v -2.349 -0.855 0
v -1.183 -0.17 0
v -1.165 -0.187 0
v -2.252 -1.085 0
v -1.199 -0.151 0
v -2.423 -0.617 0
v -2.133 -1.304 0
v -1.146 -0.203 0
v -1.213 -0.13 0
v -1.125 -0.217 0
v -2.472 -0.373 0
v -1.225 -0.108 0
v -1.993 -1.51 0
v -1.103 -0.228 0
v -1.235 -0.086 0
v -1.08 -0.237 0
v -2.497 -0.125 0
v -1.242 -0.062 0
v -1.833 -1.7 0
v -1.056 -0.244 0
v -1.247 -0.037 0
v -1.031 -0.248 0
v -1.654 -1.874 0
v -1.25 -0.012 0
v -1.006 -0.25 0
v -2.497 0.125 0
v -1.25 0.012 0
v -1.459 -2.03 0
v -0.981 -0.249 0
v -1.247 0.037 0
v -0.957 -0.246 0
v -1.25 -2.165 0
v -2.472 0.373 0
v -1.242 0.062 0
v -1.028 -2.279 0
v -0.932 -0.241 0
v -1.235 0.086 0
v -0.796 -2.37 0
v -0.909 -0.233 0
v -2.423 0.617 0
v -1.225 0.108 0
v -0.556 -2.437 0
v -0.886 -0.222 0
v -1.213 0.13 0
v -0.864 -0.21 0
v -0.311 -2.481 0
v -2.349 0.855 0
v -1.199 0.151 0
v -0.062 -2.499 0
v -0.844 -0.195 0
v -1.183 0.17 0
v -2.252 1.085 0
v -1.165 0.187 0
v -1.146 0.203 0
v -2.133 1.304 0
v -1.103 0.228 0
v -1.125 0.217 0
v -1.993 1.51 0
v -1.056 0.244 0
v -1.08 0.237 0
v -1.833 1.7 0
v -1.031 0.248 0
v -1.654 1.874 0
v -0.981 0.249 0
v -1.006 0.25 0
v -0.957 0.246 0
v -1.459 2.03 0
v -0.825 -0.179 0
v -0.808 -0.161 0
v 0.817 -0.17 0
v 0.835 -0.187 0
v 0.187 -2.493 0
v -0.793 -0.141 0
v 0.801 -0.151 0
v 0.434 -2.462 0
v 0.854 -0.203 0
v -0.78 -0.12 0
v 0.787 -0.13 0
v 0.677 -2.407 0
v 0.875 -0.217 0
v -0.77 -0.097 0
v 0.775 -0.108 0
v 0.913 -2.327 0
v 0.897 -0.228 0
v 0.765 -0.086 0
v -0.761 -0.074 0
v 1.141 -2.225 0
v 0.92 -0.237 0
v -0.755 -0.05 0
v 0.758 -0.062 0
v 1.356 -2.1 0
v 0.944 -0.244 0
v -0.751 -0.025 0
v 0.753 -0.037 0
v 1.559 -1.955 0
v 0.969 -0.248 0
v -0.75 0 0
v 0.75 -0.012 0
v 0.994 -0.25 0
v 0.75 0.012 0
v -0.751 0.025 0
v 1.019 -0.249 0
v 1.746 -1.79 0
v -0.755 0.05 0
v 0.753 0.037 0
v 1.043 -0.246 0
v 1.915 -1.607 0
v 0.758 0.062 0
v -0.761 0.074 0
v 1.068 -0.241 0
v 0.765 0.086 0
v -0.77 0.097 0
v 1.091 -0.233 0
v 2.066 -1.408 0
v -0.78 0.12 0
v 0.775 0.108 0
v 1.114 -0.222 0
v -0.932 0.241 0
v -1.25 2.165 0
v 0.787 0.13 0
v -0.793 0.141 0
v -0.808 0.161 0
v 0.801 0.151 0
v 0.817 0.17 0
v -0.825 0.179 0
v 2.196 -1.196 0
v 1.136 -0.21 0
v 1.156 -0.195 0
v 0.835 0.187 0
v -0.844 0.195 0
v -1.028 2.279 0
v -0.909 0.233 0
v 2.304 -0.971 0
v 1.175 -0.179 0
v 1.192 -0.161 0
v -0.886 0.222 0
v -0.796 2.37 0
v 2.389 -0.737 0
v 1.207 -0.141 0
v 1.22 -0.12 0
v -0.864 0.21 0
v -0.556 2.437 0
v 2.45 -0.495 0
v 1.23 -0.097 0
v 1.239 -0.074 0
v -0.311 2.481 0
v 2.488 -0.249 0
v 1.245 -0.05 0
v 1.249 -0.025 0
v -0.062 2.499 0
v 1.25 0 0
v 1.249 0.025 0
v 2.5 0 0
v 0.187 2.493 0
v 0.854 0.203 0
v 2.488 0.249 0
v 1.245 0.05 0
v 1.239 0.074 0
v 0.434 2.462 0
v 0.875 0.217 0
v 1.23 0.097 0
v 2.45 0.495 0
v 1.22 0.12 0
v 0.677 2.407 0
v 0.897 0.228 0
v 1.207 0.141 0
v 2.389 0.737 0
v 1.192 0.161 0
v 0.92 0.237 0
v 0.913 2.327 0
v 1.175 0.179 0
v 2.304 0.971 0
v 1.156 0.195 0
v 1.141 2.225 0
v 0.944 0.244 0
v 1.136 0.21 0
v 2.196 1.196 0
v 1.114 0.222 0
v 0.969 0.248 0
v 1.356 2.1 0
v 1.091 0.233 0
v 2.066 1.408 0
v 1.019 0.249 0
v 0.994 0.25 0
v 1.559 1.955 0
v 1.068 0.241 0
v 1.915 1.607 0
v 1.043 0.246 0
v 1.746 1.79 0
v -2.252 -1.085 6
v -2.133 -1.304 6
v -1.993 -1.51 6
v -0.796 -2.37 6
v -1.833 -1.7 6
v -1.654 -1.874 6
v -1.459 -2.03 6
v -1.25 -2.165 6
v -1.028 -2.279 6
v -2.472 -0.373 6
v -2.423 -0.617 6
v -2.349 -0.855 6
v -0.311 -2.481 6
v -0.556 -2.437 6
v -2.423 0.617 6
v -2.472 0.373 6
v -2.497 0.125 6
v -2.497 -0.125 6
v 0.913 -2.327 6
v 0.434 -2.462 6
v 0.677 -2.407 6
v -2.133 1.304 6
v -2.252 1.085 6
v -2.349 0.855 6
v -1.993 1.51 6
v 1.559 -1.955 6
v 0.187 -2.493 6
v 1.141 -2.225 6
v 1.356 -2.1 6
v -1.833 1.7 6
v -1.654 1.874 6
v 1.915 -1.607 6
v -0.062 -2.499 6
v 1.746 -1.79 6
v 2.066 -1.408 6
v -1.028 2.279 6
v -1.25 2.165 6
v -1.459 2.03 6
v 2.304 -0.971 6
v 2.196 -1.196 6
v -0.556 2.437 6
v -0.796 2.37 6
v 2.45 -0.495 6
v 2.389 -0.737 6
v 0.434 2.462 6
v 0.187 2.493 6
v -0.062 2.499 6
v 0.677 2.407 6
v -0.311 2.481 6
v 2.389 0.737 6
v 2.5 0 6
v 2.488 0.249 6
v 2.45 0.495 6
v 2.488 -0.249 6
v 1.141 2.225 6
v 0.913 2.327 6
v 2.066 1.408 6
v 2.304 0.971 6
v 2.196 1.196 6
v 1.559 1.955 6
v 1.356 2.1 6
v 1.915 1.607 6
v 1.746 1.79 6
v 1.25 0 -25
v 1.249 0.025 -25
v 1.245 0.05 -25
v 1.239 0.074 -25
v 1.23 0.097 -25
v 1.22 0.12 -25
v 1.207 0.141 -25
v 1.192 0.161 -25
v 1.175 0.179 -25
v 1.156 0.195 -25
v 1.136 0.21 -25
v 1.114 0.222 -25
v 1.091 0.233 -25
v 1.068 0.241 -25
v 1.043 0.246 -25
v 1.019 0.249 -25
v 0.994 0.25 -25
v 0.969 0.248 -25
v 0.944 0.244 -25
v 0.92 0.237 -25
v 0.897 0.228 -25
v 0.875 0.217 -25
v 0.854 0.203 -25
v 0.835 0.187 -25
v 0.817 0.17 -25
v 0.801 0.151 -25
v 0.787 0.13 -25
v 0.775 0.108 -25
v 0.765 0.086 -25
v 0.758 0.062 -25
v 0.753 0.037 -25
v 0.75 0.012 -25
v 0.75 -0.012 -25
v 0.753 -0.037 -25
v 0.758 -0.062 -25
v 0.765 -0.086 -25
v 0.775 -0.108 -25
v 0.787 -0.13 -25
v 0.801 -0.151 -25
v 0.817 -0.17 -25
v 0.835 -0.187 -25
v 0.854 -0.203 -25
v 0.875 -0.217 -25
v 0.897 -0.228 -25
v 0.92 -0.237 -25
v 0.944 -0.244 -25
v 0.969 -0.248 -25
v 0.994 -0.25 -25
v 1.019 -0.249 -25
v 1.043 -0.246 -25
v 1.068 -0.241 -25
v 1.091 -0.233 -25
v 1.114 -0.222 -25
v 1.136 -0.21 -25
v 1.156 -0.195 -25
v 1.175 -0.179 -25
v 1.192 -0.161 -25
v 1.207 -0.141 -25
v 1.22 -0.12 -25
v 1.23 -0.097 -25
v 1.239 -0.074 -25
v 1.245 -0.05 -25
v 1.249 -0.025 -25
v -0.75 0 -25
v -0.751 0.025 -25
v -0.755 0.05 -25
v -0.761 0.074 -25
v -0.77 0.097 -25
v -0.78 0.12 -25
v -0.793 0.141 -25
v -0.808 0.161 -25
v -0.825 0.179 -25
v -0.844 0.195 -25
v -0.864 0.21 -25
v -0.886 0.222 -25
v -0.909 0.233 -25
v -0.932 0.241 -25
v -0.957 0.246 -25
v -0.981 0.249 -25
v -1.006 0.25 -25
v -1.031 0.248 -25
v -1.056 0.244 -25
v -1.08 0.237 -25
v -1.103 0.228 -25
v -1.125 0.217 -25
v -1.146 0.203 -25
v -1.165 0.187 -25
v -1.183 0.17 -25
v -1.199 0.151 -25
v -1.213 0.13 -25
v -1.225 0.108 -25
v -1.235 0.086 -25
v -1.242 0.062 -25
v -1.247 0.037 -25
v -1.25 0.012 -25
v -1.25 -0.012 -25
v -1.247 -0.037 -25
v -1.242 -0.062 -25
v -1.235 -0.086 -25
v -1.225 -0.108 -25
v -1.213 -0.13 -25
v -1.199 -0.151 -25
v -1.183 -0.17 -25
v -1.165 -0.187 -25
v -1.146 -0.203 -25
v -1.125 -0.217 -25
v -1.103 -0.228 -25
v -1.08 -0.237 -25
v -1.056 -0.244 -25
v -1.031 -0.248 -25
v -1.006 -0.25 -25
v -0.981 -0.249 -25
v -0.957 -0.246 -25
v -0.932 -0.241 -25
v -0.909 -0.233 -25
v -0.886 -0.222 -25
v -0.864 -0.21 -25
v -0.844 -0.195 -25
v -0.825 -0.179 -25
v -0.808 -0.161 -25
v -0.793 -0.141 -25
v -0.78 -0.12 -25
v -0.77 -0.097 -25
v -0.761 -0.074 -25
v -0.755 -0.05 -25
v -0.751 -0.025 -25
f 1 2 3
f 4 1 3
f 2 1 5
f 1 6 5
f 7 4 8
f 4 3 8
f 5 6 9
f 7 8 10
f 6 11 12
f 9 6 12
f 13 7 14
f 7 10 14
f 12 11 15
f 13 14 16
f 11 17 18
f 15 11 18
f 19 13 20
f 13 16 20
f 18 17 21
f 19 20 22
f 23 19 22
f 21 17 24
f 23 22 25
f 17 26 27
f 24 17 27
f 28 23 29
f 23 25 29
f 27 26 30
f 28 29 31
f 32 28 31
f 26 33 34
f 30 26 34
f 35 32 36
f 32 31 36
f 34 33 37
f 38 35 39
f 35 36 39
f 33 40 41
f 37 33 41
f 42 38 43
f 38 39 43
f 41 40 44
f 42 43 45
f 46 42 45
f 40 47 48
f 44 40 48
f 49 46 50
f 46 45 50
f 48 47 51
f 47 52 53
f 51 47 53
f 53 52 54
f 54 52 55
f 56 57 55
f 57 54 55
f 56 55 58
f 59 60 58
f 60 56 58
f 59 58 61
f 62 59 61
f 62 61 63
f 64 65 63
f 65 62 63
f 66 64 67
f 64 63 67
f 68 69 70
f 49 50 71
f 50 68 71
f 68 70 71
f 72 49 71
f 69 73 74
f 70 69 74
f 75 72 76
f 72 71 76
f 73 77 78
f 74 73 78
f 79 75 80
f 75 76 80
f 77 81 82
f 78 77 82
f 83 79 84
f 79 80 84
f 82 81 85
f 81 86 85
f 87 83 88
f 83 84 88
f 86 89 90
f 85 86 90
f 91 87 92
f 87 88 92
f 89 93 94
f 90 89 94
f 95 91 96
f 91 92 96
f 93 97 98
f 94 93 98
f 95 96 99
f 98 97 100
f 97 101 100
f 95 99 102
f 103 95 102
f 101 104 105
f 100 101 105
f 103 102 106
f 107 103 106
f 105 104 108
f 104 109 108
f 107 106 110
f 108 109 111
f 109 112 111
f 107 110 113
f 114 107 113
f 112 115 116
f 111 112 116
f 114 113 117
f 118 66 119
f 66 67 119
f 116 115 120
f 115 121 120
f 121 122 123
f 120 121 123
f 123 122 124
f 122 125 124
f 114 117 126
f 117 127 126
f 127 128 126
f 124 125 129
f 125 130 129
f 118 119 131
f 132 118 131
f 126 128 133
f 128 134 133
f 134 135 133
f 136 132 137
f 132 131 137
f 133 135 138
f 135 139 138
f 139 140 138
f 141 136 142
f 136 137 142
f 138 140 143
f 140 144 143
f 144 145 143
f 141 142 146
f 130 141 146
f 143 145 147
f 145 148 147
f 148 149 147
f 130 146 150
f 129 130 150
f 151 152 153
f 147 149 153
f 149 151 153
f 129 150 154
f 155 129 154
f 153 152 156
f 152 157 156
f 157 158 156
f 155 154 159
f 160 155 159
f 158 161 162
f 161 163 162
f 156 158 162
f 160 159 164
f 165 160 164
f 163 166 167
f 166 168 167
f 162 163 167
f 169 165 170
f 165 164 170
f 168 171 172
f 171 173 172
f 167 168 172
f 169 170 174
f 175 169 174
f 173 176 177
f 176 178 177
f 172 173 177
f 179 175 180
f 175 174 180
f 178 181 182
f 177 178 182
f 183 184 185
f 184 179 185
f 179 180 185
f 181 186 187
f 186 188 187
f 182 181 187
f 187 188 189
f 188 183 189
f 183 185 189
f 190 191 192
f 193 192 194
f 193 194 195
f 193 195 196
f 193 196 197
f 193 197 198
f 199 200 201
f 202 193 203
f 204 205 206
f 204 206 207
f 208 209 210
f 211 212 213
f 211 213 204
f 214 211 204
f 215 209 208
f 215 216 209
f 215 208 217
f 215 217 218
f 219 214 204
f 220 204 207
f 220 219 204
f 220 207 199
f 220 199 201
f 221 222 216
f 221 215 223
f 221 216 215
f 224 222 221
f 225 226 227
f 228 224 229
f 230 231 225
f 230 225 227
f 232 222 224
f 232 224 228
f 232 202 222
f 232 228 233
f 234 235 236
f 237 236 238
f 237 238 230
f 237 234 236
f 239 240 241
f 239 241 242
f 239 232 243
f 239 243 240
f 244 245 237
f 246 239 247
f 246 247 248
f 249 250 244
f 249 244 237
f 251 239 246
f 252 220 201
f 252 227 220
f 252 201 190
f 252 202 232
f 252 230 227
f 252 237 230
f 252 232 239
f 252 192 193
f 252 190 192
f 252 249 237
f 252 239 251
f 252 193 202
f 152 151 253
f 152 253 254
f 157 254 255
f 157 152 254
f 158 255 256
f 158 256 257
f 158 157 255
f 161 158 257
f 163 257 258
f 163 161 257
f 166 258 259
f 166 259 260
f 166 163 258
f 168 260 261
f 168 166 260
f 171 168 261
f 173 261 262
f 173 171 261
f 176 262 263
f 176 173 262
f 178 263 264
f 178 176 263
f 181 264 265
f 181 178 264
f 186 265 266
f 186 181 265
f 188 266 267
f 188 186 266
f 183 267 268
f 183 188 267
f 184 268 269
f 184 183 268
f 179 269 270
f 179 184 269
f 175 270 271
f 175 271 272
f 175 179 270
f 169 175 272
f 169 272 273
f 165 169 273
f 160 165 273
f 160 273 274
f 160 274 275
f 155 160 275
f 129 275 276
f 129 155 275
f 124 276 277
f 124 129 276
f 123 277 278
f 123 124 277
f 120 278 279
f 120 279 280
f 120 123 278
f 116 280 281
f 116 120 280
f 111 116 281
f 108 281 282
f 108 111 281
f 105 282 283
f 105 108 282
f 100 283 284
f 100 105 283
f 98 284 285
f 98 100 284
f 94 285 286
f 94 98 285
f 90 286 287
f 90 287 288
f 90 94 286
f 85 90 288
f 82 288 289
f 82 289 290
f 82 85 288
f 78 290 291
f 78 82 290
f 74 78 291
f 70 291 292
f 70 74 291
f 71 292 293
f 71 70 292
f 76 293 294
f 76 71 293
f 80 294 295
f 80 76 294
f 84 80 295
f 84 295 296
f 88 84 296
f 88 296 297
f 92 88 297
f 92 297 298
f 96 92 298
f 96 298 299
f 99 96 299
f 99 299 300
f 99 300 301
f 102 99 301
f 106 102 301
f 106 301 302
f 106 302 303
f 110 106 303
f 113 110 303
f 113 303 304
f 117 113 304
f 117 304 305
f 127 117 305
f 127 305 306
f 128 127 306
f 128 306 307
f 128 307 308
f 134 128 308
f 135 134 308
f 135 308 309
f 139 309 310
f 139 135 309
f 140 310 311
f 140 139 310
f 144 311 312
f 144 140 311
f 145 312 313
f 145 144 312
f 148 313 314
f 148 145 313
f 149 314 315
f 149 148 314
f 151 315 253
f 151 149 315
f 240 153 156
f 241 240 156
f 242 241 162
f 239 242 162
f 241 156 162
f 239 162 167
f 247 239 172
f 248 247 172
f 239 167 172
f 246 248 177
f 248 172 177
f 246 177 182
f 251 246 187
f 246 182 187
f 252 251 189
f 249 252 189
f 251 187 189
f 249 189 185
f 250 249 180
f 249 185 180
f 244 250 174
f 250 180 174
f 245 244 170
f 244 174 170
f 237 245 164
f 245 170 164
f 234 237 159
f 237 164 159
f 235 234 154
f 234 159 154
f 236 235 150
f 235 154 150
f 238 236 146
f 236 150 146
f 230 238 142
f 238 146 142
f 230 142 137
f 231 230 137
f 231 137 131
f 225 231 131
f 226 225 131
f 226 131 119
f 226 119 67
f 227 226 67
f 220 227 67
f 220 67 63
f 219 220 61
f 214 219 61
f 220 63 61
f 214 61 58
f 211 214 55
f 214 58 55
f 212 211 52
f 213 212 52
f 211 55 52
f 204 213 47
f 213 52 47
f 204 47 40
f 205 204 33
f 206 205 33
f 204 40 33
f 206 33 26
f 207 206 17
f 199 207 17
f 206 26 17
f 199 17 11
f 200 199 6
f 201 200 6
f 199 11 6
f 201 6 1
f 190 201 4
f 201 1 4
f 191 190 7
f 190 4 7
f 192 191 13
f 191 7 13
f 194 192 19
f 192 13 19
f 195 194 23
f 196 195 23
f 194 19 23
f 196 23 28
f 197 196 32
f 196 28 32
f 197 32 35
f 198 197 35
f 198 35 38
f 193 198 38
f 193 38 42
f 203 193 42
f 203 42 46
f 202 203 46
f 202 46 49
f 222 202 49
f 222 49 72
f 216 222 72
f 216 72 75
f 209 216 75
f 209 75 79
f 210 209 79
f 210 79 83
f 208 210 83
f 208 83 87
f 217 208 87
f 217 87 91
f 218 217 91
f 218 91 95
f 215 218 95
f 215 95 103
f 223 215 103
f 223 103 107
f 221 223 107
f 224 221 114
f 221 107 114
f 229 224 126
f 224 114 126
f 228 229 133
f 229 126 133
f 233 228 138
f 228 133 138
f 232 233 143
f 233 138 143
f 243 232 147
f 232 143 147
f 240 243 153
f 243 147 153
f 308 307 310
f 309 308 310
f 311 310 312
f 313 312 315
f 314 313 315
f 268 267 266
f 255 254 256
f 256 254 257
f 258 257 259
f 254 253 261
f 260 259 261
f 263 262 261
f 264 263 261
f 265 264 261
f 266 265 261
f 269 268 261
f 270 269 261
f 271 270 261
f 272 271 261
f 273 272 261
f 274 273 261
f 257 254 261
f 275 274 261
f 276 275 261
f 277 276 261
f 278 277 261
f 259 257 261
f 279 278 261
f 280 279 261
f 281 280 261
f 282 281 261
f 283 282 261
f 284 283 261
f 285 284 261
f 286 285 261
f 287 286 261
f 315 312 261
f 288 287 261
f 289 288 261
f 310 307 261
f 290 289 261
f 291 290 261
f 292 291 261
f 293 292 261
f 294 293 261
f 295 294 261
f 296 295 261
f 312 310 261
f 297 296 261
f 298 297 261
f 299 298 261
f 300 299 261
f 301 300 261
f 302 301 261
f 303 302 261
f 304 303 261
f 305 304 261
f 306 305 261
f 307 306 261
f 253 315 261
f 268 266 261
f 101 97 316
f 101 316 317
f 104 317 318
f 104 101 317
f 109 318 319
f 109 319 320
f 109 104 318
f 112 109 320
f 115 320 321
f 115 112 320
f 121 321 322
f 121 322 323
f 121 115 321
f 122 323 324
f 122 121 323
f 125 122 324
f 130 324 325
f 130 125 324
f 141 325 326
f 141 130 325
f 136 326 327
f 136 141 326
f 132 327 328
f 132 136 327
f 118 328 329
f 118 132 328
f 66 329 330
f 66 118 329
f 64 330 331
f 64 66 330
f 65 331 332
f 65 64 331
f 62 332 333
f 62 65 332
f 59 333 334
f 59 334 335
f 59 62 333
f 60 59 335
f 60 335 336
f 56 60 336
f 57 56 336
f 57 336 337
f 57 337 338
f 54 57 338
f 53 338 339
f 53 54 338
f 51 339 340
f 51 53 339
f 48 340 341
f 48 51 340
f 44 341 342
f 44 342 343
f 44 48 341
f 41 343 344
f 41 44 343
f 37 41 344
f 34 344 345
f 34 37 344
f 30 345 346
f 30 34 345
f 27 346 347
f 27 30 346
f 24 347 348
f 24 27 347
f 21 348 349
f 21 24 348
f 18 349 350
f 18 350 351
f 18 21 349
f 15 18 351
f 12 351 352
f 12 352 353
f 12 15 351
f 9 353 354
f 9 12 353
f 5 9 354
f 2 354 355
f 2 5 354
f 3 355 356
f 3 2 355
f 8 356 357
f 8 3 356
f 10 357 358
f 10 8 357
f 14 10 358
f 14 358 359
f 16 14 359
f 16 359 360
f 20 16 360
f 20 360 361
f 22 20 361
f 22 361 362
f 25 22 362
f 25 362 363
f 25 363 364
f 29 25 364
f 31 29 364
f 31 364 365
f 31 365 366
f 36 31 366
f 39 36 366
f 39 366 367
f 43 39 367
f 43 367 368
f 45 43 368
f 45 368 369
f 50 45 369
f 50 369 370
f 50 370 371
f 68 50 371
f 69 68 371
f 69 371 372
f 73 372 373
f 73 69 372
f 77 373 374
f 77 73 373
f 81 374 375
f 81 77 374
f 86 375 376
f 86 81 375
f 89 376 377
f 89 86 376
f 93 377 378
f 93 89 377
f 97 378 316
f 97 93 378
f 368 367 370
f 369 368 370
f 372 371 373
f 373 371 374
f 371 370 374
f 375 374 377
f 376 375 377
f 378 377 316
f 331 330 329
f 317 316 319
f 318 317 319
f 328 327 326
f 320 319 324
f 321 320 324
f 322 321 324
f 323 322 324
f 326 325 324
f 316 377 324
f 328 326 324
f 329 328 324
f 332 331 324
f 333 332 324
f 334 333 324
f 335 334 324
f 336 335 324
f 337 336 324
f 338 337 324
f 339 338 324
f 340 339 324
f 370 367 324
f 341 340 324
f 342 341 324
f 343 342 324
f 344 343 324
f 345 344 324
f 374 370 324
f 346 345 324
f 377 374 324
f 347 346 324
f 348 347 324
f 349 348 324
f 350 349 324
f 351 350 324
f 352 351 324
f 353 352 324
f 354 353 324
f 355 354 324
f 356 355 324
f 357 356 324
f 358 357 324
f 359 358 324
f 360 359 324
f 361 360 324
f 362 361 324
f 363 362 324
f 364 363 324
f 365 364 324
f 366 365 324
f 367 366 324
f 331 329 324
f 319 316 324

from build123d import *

# Parameters (mm, degrees)
SKETCH1_R           = 2.5
BOSS_EXTRUDE1_DEPTH = 6
SKETCH2_R           = 0.25
BOSS_EXTRUDE2_DEPTH = 25


with BuildPart() as part:
    # Sketch1 → Boss-Extrude1 (new body)
    with BuildSketch(Plane.XY):
        Circle(SKETCH1_R)
    extrude(amount=BOSS_EXTRUDE1_DEPTH)

    # Sketch2 → Boss-Extrude2 (add)
    with BuildSketch(Plane.XY):
        with Locations((-1, 0)):
            Circle(SKETCH2_R)
        with Locations((1, 0)):
            Circle(SKETCH2_R)
    extrude(amount=-BOSS_EXTRUDE2_DEPTH)


solid = part.part
